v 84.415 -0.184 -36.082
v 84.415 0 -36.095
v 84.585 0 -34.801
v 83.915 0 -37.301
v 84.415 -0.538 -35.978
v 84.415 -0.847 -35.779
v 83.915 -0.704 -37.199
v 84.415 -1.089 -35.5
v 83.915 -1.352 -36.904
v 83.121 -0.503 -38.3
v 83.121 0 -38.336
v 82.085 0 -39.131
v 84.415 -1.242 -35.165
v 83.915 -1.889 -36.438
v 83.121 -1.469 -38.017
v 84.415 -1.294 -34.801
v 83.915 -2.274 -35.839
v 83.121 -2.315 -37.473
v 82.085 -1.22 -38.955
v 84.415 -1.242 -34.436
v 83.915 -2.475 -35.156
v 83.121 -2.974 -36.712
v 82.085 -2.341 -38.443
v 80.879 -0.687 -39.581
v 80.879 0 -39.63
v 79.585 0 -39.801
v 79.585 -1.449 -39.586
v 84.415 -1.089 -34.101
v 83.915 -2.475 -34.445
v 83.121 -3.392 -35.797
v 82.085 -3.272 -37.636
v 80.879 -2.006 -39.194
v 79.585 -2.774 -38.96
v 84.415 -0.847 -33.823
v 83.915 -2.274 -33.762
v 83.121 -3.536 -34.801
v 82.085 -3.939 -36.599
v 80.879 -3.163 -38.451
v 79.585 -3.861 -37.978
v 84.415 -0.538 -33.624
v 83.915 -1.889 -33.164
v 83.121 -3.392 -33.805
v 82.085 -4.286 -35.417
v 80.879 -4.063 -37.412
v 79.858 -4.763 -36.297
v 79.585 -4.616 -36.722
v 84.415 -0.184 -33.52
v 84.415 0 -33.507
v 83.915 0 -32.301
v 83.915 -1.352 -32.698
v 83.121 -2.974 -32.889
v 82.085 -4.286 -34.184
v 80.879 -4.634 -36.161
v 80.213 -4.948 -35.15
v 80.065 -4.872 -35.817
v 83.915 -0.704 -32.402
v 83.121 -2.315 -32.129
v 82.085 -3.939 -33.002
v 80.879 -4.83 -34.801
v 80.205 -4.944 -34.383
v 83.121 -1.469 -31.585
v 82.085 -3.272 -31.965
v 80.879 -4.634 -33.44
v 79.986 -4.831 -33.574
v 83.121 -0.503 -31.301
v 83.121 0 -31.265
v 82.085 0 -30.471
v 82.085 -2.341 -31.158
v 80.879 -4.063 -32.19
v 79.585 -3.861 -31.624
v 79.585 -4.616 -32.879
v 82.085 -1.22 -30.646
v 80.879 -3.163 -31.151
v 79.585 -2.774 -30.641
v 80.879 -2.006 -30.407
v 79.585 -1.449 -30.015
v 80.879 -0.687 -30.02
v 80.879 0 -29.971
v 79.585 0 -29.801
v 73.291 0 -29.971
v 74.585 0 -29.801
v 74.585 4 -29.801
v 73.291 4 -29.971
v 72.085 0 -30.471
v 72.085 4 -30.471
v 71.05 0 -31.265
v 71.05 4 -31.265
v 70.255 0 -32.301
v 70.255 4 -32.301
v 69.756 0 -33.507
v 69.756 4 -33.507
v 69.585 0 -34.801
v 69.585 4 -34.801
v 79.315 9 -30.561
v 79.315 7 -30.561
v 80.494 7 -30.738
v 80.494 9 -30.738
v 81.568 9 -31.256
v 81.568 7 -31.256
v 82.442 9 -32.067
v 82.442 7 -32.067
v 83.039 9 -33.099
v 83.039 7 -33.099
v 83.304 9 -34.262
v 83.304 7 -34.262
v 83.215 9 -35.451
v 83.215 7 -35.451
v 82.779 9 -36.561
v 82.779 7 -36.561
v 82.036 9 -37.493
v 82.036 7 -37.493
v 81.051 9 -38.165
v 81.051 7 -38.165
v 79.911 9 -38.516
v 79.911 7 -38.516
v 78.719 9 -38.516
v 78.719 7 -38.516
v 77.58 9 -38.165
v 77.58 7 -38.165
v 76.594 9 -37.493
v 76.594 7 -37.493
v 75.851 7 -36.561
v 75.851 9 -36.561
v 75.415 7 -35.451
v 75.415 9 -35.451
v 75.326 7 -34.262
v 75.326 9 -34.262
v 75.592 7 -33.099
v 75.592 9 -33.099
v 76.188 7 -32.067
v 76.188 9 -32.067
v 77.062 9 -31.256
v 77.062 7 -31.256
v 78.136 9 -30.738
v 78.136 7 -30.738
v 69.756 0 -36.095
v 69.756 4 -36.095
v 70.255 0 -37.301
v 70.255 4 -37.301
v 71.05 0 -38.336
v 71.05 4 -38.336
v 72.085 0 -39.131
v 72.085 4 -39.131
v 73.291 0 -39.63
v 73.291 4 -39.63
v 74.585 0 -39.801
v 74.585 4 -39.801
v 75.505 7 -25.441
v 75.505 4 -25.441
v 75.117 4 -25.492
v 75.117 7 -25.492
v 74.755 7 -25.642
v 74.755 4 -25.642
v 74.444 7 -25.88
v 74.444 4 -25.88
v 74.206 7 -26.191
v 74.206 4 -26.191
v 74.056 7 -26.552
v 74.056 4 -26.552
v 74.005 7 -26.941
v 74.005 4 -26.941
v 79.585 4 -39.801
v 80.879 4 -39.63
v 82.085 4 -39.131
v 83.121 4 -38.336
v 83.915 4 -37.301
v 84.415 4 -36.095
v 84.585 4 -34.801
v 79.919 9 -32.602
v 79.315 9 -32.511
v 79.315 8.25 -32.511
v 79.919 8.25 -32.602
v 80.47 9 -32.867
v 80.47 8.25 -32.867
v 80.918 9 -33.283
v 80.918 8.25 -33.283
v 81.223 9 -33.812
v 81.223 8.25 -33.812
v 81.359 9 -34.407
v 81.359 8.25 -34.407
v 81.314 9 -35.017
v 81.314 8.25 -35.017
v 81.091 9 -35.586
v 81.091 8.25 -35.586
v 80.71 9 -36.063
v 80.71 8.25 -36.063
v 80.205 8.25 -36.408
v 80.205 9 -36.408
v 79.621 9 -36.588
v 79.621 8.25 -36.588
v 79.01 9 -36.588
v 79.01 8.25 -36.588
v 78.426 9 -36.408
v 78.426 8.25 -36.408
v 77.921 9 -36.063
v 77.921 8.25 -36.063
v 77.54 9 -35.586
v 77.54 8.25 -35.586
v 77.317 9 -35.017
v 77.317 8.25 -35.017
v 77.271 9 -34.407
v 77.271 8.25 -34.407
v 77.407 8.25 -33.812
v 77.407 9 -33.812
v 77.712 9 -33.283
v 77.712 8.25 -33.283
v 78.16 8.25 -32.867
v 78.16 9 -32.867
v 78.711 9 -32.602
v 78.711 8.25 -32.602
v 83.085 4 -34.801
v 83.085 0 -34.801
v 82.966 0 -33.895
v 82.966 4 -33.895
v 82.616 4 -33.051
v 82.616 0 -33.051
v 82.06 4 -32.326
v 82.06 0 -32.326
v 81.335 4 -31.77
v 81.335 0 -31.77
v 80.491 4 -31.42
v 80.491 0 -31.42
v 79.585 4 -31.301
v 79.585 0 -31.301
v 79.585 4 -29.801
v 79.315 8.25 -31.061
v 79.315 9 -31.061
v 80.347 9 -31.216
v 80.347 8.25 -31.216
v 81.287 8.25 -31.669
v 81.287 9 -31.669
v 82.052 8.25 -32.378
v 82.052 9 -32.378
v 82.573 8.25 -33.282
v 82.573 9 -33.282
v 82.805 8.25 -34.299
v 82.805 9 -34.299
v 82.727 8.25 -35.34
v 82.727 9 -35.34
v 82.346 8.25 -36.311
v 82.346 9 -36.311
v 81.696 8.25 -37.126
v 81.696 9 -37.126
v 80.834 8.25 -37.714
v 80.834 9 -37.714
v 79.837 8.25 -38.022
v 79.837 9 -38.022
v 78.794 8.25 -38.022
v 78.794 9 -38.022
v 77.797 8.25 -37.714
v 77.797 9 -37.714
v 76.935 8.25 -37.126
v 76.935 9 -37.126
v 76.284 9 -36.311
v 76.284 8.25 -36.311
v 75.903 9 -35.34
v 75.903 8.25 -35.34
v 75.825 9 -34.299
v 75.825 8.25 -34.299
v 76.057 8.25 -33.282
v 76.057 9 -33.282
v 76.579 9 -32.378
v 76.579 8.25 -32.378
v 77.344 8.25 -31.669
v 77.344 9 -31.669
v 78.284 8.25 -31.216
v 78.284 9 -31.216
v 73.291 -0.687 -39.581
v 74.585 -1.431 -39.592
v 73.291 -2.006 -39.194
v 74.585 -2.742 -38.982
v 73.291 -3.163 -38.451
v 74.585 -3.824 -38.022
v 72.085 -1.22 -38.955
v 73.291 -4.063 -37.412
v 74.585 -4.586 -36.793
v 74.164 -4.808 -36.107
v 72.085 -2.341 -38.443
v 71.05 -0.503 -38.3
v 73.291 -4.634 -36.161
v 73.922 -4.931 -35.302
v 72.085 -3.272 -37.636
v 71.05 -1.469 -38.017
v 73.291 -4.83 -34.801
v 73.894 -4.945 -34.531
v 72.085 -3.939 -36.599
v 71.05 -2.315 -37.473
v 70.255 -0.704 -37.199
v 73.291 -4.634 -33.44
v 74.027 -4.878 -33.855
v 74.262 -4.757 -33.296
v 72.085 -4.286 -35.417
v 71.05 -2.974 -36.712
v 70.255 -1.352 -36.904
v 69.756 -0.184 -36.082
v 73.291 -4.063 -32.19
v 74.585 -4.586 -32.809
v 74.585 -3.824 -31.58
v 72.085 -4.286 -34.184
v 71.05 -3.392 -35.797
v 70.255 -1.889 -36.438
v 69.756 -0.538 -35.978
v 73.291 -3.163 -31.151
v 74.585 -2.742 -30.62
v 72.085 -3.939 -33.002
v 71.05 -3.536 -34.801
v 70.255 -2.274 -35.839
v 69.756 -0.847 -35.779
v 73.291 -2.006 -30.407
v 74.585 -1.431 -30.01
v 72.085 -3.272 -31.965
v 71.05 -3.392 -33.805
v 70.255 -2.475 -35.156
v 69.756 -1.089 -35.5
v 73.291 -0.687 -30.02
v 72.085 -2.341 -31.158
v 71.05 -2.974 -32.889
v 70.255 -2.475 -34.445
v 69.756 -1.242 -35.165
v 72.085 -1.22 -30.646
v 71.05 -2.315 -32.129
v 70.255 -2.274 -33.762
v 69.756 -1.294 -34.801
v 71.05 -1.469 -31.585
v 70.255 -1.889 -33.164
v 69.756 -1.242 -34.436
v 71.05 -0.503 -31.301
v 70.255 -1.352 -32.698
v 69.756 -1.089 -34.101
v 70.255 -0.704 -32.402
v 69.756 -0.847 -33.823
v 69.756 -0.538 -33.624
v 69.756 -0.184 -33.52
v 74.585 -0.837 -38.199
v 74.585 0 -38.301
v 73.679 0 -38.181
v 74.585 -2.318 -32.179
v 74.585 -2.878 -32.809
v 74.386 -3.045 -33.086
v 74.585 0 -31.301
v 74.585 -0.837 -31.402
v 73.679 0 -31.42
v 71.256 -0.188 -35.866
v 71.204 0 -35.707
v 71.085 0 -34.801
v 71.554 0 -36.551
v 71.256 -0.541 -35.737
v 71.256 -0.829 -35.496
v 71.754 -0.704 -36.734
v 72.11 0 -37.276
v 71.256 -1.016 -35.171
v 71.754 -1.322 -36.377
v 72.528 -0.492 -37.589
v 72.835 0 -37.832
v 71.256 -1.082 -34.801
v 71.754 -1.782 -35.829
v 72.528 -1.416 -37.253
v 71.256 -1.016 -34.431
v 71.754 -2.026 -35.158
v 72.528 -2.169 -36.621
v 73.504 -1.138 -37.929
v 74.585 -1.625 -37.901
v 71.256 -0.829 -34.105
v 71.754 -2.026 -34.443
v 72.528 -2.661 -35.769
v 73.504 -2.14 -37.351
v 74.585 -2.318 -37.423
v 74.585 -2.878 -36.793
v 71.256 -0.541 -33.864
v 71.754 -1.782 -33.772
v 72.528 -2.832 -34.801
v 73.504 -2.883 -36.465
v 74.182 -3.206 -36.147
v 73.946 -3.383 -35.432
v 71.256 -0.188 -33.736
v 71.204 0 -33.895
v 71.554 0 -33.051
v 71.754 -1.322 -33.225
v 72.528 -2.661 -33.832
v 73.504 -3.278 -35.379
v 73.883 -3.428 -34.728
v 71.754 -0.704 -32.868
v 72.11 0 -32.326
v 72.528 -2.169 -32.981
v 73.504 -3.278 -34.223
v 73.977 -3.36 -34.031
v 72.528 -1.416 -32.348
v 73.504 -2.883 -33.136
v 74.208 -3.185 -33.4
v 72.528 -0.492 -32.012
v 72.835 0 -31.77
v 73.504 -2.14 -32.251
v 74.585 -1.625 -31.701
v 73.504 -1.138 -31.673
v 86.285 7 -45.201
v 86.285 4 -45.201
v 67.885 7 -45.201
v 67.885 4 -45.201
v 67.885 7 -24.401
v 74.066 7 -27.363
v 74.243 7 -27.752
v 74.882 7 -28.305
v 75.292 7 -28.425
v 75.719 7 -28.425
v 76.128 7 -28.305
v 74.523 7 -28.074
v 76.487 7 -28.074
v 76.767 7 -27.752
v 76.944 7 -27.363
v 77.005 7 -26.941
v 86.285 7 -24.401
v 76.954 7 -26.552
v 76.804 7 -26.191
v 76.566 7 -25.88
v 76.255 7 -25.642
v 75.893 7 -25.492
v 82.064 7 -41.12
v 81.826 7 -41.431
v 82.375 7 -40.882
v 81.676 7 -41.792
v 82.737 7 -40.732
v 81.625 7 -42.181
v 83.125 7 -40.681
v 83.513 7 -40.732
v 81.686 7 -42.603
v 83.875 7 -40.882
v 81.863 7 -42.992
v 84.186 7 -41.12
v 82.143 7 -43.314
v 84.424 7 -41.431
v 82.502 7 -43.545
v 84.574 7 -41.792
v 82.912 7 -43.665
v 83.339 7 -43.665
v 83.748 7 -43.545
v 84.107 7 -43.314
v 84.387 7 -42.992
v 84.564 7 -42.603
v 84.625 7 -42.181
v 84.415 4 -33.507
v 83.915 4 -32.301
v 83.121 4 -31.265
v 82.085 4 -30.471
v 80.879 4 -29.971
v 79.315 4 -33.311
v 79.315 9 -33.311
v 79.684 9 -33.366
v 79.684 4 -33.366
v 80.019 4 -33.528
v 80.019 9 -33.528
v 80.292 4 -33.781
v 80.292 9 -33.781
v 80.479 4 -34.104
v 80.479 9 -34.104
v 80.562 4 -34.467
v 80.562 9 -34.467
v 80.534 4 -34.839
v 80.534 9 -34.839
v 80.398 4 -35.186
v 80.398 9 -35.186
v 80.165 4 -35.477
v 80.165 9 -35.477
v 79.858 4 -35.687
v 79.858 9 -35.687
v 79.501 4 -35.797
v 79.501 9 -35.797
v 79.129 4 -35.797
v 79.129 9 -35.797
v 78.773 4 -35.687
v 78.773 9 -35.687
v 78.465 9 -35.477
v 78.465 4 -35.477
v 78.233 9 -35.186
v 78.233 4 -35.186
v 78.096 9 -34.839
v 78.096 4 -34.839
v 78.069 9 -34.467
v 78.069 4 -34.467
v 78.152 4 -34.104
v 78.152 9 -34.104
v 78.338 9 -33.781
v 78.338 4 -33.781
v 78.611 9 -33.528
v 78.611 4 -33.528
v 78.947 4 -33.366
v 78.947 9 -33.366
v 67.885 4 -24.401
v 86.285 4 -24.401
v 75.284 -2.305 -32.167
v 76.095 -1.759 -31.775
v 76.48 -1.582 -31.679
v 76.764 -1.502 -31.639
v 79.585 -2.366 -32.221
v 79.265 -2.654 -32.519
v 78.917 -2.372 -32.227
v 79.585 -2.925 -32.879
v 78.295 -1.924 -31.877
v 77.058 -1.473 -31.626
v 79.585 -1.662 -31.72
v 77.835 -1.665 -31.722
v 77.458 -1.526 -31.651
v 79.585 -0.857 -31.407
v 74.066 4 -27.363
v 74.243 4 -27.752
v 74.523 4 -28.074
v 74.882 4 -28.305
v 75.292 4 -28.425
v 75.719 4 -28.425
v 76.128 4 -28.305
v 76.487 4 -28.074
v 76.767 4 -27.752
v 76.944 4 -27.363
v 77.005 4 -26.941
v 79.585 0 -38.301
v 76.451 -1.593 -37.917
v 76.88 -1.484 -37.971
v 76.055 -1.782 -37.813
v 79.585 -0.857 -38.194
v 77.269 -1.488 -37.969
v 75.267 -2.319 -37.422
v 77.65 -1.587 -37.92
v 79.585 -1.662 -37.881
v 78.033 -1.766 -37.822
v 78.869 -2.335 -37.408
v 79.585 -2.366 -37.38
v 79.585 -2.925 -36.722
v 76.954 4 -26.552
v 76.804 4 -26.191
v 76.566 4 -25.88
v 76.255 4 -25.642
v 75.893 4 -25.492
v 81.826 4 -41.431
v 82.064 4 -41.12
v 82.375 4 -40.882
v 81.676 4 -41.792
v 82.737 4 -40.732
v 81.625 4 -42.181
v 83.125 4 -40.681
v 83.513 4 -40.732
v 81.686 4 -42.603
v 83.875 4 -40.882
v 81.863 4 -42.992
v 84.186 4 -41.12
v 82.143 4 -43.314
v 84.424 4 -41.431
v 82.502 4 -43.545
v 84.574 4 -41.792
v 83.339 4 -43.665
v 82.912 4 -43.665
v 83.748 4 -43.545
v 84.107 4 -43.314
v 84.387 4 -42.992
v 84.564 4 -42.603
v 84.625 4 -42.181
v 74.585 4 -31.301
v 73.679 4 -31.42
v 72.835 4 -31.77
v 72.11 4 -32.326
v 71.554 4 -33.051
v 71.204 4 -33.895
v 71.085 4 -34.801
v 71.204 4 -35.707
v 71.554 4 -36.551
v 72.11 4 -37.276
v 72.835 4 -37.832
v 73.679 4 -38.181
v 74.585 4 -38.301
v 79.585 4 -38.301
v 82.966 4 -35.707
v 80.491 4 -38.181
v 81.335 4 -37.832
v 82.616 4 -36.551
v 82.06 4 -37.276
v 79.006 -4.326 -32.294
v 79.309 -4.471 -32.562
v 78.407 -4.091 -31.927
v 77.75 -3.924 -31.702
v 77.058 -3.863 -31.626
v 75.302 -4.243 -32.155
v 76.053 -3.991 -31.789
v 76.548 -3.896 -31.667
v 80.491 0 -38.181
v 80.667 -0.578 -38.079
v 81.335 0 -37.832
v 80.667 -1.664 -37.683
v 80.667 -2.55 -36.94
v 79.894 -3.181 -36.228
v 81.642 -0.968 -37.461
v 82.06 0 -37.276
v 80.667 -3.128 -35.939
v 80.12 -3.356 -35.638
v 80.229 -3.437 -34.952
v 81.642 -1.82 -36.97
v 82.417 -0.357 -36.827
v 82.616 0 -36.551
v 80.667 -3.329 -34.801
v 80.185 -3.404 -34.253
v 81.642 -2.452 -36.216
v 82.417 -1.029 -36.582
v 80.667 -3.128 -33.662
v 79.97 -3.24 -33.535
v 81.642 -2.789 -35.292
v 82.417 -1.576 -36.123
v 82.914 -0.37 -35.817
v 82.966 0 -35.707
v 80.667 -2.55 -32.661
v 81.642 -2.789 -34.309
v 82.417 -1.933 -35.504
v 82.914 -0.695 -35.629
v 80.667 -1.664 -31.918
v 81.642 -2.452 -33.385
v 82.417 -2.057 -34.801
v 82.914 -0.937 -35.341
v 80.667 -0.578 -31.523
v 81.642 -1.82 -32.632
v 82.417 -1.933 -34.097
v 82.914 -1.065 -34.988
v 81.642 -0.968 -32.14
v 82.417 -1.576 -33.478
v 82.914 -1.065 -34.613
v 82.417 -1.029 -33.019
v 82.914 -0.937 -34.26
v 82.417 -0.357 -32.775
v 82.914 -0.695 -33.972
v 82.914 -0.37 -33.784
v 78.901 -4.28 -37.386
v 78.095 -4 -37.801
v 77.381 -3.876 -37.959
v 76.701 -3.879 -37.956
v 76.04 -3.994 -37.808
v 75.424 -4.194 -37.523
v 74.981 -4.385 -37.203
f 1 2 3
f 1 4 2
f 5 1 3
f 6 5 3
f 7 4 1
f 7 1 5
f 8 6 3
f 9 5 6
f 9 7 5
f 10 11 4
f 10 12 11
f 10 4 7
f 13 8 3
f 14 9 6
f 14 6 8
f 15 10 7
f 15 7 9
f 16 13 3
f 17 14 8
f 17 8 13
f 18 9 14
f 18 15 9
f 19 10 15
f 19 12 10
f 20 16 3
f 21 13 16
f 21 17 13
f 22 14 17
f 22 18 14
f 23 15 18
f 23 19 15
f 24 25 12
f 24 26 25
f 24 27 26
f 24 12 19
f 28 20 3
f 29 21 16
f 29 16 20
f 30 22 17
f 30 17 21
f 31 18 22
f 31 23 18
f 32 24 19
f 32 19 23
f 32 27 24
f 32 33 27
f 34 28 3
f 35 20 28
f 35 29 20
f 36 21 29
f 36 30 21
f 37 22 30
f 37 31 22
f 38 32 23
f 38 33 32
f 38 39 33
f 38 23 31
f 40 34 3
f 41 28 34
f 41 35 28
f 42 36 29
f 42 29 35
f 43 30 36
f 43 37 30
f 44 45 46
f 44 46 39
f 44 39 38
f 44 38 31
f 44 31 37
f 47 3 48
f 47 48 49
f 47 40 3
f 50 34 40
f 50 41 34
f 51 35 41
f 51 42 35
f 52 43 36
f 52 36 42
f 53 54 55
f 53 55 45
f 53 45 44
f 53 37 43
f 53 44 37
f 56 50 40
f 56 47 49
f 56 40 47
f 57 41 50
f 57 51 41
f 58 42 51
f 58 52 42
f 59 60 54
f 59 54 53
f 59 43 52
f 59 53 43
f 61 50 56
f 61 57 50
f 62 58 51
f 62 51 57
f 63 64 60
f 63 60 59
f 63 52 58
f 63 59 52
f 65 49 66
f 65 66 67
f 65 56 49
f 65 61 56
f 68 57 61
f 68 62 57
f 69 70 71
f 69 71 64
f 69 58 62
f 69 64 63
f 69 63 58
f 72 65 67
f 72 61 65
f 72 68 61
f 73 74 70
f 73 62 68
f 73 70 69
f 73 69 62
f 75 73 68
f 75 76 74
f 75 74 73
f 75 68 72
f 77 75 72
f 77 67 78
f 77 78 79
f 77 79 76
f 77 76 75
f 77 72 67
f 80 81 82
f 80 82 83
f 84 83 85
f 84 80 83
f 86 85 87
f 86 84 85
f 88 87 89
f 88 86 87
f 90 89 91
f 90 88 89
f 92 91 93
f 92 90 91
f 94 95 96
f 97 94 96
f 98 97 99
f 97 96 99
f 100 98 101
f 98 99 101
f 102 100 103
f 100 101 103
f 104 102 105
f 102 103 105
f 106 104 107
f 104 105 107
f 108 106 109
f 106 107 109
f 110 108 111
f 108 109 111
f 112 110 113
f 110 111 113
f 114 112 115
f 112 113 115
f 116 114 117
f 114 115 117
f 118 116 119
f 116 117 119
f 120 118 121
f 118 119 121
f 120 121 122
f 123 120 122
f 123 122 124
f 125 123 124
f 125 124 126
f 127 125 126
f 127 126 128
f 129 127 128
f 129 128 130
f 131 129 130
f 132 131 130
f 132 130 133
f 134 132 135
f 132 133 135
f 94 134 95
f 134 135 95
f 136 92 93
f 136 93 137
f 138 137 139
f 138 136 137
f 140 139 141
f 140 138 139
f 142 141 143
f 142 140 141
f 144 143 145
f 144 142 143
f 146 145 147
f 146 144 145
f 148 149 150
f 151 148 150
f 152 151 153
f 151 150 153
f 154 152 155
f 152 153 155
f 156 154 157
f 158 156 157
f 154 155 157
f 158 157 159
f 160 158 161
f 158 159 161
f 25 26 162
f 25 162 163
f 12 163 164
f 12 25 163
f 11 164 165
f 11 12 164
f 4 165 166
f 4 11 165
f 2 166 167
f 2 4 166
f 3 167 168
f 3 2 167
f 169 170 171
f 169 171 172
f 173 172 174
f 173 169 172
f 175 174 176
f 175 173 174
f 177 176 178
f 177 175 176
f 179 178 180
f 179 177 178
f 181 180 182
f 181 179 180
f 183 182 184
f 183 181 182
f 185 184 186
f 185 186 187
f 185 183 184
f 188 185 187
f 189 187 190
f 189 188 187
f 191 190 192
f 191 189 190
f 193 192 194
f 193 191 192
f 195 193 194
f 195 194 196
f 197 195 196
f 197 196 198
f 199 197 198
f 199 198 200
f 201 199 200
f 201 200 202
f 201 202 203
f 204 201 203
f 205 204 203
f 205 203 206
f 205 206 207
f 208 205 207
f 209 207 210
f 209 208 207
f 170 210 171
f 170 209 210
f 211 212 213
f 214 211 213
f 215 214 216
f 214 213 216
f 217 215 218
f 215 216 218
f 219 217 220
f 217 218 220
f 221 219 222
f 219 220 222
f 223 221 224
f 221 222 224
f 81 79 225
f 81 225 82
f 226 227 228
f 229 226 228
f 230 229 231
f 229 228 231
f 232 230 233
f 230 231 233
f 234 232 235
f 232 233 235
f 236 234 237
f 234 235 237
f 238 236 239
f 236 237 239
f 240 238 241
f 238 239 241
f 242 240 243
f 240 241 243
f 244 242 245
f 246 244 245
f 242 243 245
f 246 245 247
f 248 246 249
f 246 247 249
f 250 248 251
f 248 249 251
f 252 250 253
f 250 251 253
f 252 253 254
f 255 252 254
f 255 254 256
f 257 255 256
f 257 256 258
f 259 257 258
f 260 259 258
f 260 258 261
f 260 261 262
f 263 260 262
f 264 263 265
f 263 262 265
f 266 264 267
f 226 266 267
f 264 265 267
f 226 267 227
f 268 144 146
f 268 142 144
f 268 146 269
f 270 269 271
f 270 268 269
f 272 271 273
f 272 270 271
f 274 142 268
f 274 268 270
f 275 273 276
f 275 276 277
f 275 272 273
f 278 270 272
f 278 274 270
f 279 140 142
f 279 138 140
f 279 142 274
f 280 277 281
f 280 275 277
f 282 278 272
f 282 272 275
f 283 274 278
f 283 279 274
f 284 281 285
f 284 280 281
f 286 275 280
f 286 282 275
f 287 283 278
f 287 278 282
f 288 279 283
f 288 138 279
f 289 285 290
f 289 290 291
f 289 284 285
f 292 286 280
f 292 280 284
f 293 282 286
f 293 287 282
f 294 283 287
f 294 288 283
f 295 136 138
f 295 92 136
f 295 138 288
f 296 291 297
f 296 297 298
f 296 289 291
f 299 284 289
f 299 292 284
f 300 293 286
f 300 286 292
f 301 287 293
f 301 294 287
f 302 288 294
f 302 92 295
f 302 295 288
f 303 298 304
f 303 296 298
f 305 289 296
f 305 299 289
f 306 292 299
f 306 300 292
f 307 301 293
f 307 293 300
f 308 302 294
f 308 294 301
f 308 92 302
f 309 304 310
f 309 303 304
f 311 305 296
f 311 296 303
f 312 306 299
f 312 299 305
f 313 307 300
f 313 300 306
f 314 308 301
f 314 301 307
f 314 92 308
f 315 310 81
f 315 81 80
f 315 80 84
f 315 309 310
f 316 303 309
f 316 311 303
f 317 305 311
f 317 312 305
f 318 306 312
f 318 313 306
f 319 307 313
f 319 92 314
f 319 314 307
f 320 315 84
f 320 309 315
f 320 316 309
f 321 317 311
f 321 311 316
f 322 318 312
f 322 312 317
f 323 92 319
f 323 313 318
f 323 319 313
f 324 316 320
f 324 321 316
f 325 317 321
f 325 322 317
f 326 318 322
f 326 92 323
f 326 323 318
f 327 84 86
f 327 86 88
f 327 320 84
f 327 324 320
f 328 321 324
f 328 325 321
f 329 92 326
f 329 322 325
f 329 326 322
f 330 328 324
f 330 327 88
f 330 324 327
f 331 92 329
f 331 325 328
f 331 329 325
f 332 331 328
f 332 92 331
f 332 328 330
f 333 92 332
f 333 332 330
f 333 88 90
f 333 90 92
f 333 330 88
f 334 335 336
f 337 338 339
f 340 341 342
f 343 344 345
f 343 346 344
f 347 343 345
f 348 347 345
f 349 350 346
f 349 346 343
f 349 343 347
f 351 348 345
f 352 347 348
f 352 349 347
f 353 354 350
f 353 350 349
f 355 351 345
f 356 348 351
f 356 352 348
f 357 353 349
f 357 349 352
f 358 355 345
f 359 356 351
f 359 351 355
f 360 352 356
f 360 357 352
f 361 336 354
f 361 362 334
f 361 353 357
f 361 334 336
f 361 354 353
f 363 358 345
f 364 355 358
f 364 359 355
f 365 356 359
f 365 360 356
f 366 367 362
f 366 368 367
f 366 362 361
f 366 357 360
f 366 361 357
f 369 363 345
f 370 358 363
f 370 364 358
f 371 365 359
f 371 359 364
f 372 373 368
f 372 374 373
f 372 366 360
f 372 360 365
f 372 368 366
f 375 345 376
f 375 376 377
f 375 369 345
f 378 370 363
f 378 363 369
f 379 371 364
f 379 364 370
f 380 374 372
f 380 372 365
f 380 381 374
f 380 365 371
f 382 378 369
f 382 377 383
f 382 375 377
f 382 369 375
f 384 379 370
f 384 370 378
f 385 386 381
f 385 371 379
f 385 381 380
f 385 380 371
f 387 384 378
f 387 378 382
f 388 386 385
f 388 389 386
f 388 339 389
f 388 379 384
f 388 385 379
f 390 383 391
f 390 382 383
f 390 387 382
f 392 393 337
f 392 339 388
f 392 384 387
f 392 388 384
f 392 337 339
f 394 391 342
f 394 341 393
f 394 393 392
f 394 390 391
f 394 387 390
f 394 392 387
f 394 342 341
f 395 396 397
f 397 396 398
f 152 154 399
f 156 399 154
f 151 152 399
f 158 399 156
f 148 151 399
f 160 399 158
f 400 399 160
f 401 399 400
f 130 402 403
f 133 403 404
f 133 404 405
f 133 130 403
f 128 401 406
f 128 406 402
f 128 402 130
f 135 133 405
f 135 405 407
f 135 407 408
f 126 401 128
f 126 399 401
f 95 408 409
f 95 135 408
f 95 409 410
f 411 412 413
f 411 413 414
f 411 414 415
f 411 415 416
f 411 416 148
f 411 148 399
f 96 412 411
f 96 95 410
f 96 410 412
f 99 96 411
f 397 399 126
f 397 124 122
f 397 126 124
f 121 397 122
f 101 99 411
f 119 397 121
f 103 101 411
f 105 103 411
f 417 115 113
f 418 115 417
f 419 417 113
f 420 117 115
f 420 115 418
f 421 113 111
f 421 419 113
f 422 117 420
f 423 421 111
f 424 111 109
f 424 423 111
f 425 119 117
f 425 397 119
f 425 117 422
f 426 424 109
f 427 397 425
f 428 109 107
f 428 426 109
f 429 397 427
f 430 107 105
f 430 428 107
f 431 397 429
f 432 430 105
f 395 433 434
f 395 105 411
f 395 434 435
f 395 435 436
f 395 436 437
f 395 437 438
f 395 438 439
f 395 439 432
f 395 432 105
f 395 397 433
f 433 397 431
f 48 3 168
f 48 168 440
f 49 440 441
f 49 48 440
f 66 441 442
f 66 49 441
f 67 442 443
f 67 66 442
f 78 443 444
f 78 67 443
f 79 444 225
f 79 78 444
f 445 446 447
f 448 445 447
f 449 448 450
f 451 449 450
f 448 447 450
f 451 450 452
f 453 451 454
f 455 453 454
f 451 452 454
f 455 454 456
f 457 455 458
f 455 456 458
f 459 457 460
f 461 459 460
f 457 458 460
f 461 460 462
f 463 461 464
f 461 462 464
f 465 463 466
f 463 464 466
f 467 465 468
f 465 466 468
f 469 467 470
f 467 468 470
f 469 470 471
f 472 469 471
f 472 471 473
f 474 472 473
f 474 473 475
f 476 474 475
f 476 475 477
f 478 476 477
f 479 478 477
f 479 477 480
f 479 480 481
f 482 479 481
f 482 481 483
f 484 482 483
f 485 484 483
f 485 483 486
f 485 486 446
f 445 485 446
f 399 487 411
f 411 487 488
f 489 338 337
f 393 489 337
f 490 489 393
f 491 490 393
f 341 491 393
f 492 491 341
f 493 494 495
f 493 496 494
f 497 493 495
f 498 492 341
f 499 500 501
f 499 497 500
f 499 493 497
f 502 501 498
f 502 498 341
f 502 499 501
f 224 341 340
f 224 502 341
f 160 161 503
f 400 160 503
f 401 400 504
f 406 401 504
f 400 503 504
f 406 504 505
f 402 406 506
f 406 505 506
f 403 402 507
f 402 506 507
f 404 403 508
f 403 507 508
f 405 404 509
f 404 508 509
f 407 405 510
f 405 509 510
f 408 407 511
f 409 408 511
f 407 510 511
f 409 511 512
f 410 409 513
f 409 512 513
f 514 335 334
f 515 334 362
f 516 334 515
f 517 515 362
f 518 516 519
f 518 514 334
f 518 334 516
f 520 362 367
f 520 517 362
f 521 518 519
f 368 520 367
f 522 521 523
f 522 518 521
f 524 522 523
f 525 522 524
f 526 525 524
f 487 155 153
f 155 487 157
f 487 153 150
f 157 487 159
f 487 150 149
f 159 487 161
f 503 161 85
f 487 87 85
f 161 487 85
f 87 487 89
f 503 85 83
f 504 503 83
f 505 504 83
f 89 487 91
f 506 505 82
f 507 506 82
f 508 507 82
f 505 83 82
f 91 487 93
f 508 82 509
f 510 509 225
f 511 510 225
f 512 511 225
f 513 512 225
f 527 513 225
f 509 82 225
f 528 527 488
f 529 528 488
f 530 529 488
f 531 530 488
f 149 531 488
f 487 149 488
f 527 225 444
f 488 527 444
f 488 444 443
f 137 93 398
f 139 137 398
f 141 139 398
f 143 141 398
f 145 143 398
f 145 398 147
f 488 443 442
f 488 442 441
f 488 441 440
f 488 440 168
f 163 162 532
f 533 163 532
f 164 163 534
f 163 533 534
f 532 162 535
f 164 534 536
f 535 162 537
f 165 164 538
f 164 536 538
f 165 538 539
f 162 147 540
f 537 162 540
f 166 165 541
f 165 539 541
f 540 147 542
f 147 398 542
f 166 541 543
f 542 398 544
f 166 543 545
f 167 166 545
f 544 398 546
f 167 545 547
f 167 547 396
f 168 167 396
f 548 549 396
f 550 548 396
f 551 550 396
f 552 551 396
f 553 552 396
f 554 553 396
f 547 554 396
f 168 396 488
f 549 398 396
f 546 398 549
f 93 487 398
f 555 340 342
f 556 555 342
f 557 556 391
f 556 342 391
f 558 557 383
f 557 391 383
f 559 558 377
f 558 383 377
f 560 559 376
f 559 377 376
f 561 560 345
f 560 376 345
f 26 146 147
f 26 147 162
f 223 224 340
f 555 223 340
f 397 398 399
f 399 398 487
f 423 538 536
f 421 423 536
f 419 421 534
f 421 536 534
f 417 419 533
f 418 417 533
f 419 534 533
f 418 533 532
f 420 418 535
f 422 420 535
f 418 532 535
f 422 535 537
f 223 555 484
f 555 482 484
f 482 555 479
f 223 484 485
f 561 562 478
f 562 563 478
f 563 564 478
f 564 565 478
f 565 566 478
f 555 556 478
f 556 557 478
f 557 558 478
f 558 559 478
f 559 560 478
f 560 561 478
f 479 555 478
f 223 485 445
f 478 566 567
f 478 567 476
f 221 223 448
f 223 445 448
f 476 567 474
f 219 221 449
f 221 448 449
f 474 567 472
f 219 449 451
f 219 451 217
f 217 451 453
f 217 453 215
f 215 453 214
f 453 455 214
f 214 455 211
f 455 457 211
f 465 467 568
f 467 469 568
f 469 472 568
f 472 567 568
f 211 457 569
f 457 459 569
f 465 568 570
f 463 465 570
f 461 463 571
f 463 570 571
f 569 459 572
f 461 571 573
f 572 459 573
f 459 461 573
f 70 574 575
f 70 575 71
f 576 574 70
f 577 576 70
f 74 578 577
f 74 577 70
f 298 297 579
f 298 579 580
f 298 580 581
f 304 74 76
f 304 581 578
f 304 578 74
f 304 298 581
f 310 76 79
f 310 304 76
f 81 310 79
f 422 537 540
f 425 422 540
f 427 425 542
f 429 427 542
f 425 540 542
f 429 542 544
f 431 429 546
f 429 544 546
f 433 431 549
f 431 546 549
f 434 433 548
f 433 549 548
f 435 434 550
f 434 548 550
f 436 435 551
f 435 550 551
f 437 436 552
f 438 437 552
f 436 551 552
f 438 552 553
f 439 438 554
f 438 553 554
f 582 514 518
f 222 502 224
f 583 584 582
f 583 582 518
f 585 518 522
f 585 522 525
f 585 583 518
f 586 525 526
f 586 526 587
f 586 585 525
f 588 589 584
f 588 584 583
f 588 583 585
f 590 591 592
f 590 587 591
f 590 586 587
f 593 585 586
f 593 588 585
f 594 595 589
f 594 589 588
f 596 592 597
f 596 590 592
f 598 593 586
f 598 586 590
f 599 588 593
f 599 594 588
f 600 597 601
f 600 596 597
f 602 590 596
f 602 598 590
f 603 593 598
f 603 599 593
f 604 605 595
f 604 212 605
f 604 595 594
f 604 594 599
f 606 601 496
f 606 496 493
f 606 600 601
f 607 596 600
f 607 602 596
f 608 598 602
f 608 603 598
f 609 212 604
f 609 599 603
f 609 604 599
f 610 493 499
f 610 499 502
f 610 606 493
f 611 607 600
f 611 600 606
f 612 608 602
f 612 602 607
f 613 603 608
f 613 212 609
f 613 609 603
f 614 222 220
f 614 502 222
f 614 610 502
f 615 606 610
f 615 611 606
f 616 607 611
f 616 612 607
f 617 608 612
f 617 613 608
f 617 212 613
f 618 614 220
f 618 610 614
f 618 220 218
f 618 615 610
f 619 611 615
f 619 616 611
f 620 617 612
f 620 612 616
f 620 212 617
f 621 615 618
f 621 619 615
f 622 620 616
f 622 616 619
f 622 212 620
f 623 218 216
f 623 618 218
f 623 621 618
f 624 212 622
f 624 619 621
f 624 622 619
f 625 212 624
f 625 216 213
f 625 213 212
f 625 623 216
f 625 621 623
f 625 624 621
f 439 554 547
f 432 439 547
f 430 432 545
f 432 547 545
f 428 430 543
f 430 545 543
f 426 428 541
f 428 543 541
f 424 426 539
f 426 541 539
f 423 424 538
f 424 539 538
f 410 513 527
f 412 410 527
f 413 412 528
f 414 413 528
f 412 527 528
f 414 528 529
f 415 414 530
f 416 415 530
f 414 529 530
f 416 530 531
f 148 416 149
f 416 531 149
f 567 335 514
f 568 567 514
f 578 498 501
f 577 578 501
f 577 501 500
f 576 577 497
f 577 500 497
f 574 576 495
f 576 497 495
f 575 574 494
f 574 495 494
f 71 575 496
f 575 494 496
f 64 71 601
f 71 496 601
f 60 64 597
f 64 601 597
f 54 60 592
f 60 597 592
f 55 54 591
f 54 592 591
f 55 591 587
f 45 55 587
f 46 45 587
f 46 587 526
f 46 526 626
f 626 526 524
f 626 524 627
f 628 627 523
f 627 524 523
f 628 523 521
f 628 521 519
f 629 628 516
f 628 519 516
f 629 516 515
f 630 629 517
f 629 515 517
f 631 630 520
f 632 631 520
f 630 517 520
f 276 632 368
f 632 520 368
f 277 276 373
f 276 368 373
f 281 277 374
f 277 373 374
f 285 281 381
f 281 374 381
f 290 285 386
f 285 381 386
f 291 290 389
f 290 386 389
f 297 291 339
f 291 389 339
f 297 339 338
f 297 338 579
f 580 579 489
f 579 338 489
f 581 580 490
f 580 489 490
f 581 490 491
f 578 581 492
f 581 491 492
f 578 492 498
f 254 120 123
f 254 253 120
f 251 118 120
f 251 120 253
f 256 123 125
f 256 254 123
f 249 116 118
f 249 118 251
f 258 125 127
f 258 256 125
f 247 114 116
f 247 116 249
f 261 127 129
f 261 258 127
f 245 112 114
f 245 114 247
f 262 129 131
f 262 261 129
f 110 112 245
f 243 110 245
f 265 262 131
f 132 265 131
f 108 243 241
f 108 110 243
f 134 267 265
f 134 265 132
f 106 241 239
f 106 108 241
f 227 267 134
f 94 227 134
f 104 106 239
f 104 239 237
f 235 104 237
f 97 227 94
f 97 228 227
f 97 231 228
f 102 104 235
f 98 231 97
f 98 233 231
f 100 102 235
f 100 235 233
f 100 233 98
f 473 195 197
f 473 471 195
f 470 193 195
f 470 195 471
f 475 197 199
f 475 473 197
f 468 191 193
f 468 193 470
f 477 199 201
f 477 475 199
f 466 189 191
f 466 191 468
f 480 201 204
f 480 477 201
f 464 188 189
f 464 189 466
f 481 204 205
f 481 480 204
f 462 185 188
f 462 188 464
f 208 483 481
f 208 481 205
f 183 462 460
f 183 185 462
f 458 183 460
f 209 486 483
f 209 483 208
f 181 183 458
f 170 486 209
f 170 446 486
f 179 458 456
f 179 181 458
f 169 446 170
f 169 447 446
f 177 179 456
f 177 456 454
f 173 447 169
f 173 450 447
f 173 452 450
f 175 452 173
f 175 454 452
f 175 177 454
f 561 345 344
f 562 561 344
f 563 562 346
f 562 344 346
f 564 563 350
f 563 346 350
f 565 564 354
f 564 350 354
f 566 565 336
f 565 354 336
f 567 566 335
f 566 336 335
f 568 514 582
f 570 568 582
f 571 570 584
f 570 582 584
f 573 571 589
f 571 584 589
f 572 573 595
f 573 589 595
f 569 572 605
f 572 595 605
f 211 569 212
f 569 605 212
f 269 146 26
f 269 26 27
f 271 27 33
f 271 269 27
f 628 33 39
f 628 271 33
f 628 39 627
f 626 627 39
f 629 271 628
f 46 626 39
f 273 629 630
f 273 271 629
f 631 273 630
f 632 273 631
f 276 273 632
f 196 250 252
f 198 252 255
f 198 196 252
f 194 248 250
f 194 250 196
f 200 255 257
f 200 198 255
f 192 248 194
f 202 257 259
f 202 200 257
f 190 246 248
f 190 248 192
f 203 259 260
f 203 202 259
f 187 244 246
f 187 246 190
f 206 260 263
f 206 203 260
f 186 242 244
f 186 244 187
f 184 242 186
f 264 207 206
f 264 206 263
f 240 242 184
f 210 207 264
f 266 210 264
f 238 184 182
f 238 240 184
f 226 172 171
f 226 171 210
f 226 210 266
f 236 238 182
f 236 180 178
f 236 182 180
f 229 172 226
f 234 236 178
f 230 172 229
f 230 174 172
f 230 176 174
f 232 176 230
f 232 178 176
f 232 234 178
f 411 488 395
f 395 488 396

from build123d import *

# Parameters (mm, degrees)
REVOLVE1_ANGLE                  = 180
BOSS_EXTRUDE2_DEPTH             = 4
BOSS_EXTRUDE4_DEPTH             = 3
SKETCH12_R                      = 4
BOSS_EXTRUDE5_DEPTH             = 2
CUT_EXTRUDE2_REACH              = 100.408
SKETCH13_R                      = 1.25
SKETCH14_R                      = 3.5
SKETCH14_R_2                    = 2.05
CUT_EXTRUDE3_DEPTH              = 0.75
F_1_4_0_25_DIAMETER_HOLE1_D     = 6.35
F_1_4_0_25_DIAMETER_HOLE1_DEPTH = 4
F_1_4_0_25_DIAMETER_HOLE1_TIP   = 1.907732465


with BuildPart() as part:
    # Sketch2 → Revolve1 (revolve)
    with BuildSketch(Plane(origin=(0, 0, 0), x_dir=(1, 0, 0), z_dir=(0, 1, 0))):
        with BuildLine():
            Line((79.585159762, 39.800683112), (74.585159762, 39.800683112))
            ThreePointArc((74.585159762, 39.800683112), (71.049625856, 38.336217018), (69.585159762, 34.800683112))
            Line((69.585159762, 34.800683112), (71.085159762, 34.800683112))
            ThreePointArc((71.085159762, 34.800683112), (72.110286027, 37.275556846), (74.585159762, 38.300683112))
            Line((74.585159762, 38.300683112), (79.585159762, 38.300683112))
            ThreePointArc((79.585159762, 38.300683112), (82.060033496, 37.275556846), (83.085159762, 34.800683112))
            Line((83.085159762, 34.800683112), (84.585159762, 34.800683112))
            ThreePointArc((84.585159762, 34.800683112), (83.120693668, 38.336217018), (79.585159762, 39.800683112))
        make_face()
    revolve(axis=Axis((74.585159762, 0, -34.800683112), (-1, 0, 0)), revolution_arc=REVOLVE1_ANGLE)

    # Sketch7 → Boss-Extrude2 (add)
    with BuildSketch(Plane(origin=(0, 0, 0), x_dir=(1, 0, 0), z_dir=(0, 1, 0))):
        with BuildLine():
            Line((74.585159762, 39.800683112), (79.585159762, 39.800683112))
            ThreePointArc((79.585159762, 39.800683112), (83.120693668, 38.336217018), (84.585159762, 34.800683112))
            ThreePointArc((84.585159762, 34.800683112), (83.120693668, 31.265149206), (79.585159762, 29.800683112))
            Line((79.585159762, 29.800683112), (74.585159762, 29.800683112))
            ThreePointArc((74.585159762, 29.800683112), (71.049625856, 31.265149206), (69.585159762, 34.800683112))
            ThreePointArc((69.585159762, 34.800683112), (71.049625856, 38.336217018), (74.585159762, 39.800683112))
        make_face()
        with BuildLine():
            Line((74.585159762, 38.300683112), (79.585159762, 38.300683112))
            ThreePointArc((79.585159762, 38.300683112), (82.060033496, 37.275556846), (83.085159762, 34.800683112))
            ThreePointArc((83.085159762, 34.800683112), (82.060033496, 32.325809378), (79.585159762, 31.300683112))
            Line((79.585159762, 31.300683112), (74.585159762, 31.300683112))
            ThreePointArc((74.585159762, 31.300683112), (72.110286027, 32.325809378), (71.085159762, 34.800683112))
            ThreePointArc((71.085159762, 34.800683112), (72.110286027, 37.275556846), (74.585159762, 38.300683112))
        make_face(mode=Mode.SUBTRACT)
    extrude(amount=BOSS_EXTRUDE2_DEPTH)

    # Sketch8 → Boss-Extrude4 (add)
    with BuildSketch(Plane(origin=(0, 4, 0), x_dir=(1, 0, 0), z_dir=(0, 1, 0))):
        with BuildLine():
            Line((86.285159762, 45.200683112), (67.885159762, 45.200683112))
            Line((67.885159762, 45.200683112), (67.885159762, 42.180683112))
            Line((67.885159762, 42.180683112), (81.625159762, 42.180683112))
            ThreePointArc((81.625159762, 42.180683112), (83.125159762, 43.680683112), (84.625159762, 42.180683112))
            ThreePointArc((84.625159762, 42.180683112), (84.185819933, 41.12002294), (83.125159762, 40.680683112))
            Line((83.125159762, 40.680683112), (83.125159762, 38.331745275))
            ThreePointArc((83.125159762, 38.331745275), (84.585159762, 34.800683112), (83.125159762, 31.269620949))
            Line((83.125159762, 31.269620949), (83.125159762, 24.400683112))
            Line((83.125159762, 24.400683112), (86.285159762, 24.400683112))
            Line((86.285159762, 24.400683112), (86.285159762, 45.200683112))
        make_face()
        with BuildLine():
            Line((81.625159762, 42.180683112), (67.885159762, 42.180683112))
            Line((67.885159762, 42.180683112), (67.885159762, 34.560683112))
            Line((67.885159762, 34.560683112), (69.590923083, 34.560683112))
            ThreePointArc((69.590923083, 34.560683112), (70.965767547, 38.250320774), (74.585159762, 39.800683112))
            Line((74.585159762, 39.800683112), (79.585159762, 39.800683112))
            ThreePointArc((79.585159762, 39.800683112), (81.501496004, 39.418870571), (83.125159762, 38.331745275))
            Line((83.125159762, 38.331745275), (83.125159762, 40.680683112))
            ThreePointArc((83.125159762, 40.680683112), (82.06449959, 41.12002294), (81.625159762, 42.180683112))
        make_face()
        with BuildLine():
            ThreePointArc((74.585159762, 39.800683112), (70.965767547, 38.250320774), (69.590923083, 34.560683112))
            Line((69.590923083, 34.560683112), (71.093398029, 34.560683112))
            ThreePointArc((71.093398029, 34.560683112), (72.02684, 37.189197295), (74.585159762, 38.300683112))
            Line((74.585159762, 38.300683112), (79.585159762, 38.300683112))
            ThreePointArc((79.585159762, 38.300683112), (83.085159762, 34.800683112), (79.585159762, 31.300683112))
            Line((79.585159762, 31.300683112), (79.315159762, 31.300683112))
            Line((79.315159762, 31.300683112), (79.315159762, 29.800683112))
            Line((79.315159762, 29.800683112), (79.585159762, 29.800683112))
            ThreePointArc((79.585159762, 29.800683112), (81.501496004, 30.182495653), (83.125159762, 31.269620949))
            Line((83.125159762, 31.269620949), (83.125159762, 38.331745275))
            ThreePointArc((83.125159762, 38.331745275), (81.501496004, 39.418870571), (79.585159762, 39.800683112))
            Line((79.585159762, 39.800683112), (74.585159762, 39.800683112))
        make_face()
        with BuildLine():
            Line((83.125159762, 38.331745275), (83.125159762, 31.269620949))
            ThreePointArc((83.125159762, 31.269620949), (84.585159762, 34.800683112), (83.125159762, 38.331745275))
        make_face()
        with BuildLine():
            ThreePointArc((74.585159762, 38.300683112), (72.02684, 37.189197295), (71.093398029, 34.560683112))
            Line((71.093398029, 34.560683112), (79.315159762, 34.560683112))
            Line((79.315159762, 34.560683112), (79.315159762, 31.300683112))
            Line((79.315159762, 31.300683112), (79.585159762, 31.300683112))
            ThreePointArc((79.585159762, 31.300683112), (83.085159762, 34.800683112), (79.585159762, 38.300683112))
            Line((79.585159762, 38.300683112), (74.585159762, 38.300683112))
        make_face()
        with BuildLine():
            Line((71.093398029, 34.560683112), (69.590923083, 34.560683112))
            ThreePointArc((69.590923083, 34.560683112), (71.135522099, 31.181290898), (74.585159762, 29.800683112))
            Line((74.585159762, 29.800683112), (79.315159762, 29.800683112))
            Line((79.315159762, 29.800683112), (79.315159762, 31.300683112))
            Line((79.315159762, 31.300683112), (74.585159762, 31.300683112))
            ThreePointArc((74.585159762, 31.300683112), (72.196645579, 32.242363351), (71.093398029, 34.560683112))
        make_face()
        with BuildLine():
            Line((79.315159762, 34.560683112), (71.093398029, 34.560683112))
            ThreePointArc((71.093398029, 34.560683112), (72.196645579, 32.242363351), (74.585159762, 31.300683112))
            Line((74.585159762, 31.300683112), (79.315159762, 31.300683112))
            Line((79.315159762, 31.300683112), (79.315159762, 34.560683112))
        make_face()
        with BuildLine():
            Line((74.005159762, 26.940683112), (67.885159762, 26.940683112))
            Line((67.885159762, 26.940683112), (67.885159762, 24.400683112))
            Line((67.885159762, 24.400683112), (75.505159762, 24.400683112))
            Line((75.505159762, 24.400683112), (75.505159762, 25.440683112))
            ThreePointArc((75.505159762, 25.440683112), (74.44449959, 25.88002294), (74.005159762, 26.940683112))
        make_face()
        with BuildLine():
            Line((79.315159762, 24.400683112), (83.125159762, 24.400683112))
            Line((83.125159762, 24.400683112), (83.125159762, 31.269620949))
            ThreePointArc((83.125159762, 31.269620949), (81.501496004, 30.182495653), (79.585159762, 29.800683112))
            Line((79.585159762, 29.800683112), (79.315159762, 29.800683112))
            Line((79.315159762, 29.800683112), (79.315159762, 24.400683112))
        make_face()
        with BuildLine():
            Line((69.590923083, 34.560683112), (67.885159762, 34.560683112))
            Line((67.885159762, 34.560683112), (67.885159762, 26.940683112))
            Line((67.885159762, 26.940683112), (74.005159762, 26.940683112))
            ThreePointArc((74.005159762, 26.940683112), (75.505159762, 28.440683112), (77.005159762, 26.940683112))
            ThreePointArc((77.005159762, 26.940683112), (76.565819933, 25.88002294), (75.505159762, 25.440683112))
            Line((75.505159762, 25.440683112), (75.505159762, 24.400683112))
            Line((75.505159762, 24.400683112), (79.315159762, 24.400683112))
            Line((79.315159762, 24.400683112), (79.315159762, 29.800683112))
            Line((79.315159762, 29.800683112), (74.585159762, 29.800683112))
            ThreePointArc((74.585159762, 29.800683112), (71.135522099, 31.181290898), (69.590923083, 34.560683112))
        make_face()
    extrude(amount=BOSS_EXTRUDE4_DEPTH)

    # Sketch12 → Boss-Extrude5 (add)
    with BuildSketch(Plane(origin=(0, 7, 0), x_dir=(1, 0, 0), z_dir=(0, 1, 0))):
        with Locations(Location((79.315159762, 34.560683112, 0), (0, 0, 270))):
            Circle(SKETCH12_R)
    extrude(amount=BOSS_EXTRUDE5_DEPTH)

    # Sketch13 → Cut-Extrude2 (cut, up to next)
    with BuildSketch(Plane(origin=(0, 9, 0), x_dir=(1, 0, 0), z_dir=(0, 1, 0)), mode=Mode.PRIVATE) as cut_extrude2_sk1:
        with Locations(Location((79.315159762, 34.560683112, 0), (0, 0, 270))):
            Circle(SKETCH13_R)
    cut_extrude2_tool1 = extrude(cut_extrude2_sk1.sketch, amount=-CUT_EXTRUDE2_REACH, mode=Mode.PRIVATE) & part.part
    add(cut_extrude2_tool1.solids().sort_by_distance((79.31516, 9, -34.560683))[0], mode=Mode.SUBTRACT)

    # Sketch14 → Cut-Extrude3 (cut)
    with BuildSketch(Plane(origin=(0, 9, 0), x_dir=(1, 0, 0), z_dir=(0, 1, 0))):
        with Locations(Location((79.315159762, 34.560683112, 0), (0, 0, 270))):
            Circle(SKETCH14_R)
        with Locations(Location((79.315159762, 34.560683112, 0), (0, 0, 270))):
            Circle(SKETCH14_R_2, mode=Mode.SUBTRACT)
    extrude(amount=-CUT_EXTRUDE3_DEPTH, mode=Mode.SUBTRACT)

    # 1/4 (0.25) Diameter Hole1
    with Locations(Plane(origin=(77.057625156, -5, -34.800683112), x_dir=(0, 0, -1), z_dir=(0, -1, 0))):
        with Locations((0, 0)):
            Hole(F_1_4_0_25_DIAMETER_HOLE1_D / 2, depth=F_1_4_0_25_DIAMETER_HOLE1_DEPTH)
            with Locations((0, 0, -(F_1_4_0_25_DIAMETER_HOLE1_DEPTH + F_1_4_0_25_DIAMETER_HOLE1_TIP / 2))):  # 118° drill point
                Cone(0, F_1_4_0_25_DIAMETER_HOLE1_D / 2, F_1_4_0_25_DIAMETER_HOLE1_TIP, mode=Mode.SUBTRACT)


solid = part.part
